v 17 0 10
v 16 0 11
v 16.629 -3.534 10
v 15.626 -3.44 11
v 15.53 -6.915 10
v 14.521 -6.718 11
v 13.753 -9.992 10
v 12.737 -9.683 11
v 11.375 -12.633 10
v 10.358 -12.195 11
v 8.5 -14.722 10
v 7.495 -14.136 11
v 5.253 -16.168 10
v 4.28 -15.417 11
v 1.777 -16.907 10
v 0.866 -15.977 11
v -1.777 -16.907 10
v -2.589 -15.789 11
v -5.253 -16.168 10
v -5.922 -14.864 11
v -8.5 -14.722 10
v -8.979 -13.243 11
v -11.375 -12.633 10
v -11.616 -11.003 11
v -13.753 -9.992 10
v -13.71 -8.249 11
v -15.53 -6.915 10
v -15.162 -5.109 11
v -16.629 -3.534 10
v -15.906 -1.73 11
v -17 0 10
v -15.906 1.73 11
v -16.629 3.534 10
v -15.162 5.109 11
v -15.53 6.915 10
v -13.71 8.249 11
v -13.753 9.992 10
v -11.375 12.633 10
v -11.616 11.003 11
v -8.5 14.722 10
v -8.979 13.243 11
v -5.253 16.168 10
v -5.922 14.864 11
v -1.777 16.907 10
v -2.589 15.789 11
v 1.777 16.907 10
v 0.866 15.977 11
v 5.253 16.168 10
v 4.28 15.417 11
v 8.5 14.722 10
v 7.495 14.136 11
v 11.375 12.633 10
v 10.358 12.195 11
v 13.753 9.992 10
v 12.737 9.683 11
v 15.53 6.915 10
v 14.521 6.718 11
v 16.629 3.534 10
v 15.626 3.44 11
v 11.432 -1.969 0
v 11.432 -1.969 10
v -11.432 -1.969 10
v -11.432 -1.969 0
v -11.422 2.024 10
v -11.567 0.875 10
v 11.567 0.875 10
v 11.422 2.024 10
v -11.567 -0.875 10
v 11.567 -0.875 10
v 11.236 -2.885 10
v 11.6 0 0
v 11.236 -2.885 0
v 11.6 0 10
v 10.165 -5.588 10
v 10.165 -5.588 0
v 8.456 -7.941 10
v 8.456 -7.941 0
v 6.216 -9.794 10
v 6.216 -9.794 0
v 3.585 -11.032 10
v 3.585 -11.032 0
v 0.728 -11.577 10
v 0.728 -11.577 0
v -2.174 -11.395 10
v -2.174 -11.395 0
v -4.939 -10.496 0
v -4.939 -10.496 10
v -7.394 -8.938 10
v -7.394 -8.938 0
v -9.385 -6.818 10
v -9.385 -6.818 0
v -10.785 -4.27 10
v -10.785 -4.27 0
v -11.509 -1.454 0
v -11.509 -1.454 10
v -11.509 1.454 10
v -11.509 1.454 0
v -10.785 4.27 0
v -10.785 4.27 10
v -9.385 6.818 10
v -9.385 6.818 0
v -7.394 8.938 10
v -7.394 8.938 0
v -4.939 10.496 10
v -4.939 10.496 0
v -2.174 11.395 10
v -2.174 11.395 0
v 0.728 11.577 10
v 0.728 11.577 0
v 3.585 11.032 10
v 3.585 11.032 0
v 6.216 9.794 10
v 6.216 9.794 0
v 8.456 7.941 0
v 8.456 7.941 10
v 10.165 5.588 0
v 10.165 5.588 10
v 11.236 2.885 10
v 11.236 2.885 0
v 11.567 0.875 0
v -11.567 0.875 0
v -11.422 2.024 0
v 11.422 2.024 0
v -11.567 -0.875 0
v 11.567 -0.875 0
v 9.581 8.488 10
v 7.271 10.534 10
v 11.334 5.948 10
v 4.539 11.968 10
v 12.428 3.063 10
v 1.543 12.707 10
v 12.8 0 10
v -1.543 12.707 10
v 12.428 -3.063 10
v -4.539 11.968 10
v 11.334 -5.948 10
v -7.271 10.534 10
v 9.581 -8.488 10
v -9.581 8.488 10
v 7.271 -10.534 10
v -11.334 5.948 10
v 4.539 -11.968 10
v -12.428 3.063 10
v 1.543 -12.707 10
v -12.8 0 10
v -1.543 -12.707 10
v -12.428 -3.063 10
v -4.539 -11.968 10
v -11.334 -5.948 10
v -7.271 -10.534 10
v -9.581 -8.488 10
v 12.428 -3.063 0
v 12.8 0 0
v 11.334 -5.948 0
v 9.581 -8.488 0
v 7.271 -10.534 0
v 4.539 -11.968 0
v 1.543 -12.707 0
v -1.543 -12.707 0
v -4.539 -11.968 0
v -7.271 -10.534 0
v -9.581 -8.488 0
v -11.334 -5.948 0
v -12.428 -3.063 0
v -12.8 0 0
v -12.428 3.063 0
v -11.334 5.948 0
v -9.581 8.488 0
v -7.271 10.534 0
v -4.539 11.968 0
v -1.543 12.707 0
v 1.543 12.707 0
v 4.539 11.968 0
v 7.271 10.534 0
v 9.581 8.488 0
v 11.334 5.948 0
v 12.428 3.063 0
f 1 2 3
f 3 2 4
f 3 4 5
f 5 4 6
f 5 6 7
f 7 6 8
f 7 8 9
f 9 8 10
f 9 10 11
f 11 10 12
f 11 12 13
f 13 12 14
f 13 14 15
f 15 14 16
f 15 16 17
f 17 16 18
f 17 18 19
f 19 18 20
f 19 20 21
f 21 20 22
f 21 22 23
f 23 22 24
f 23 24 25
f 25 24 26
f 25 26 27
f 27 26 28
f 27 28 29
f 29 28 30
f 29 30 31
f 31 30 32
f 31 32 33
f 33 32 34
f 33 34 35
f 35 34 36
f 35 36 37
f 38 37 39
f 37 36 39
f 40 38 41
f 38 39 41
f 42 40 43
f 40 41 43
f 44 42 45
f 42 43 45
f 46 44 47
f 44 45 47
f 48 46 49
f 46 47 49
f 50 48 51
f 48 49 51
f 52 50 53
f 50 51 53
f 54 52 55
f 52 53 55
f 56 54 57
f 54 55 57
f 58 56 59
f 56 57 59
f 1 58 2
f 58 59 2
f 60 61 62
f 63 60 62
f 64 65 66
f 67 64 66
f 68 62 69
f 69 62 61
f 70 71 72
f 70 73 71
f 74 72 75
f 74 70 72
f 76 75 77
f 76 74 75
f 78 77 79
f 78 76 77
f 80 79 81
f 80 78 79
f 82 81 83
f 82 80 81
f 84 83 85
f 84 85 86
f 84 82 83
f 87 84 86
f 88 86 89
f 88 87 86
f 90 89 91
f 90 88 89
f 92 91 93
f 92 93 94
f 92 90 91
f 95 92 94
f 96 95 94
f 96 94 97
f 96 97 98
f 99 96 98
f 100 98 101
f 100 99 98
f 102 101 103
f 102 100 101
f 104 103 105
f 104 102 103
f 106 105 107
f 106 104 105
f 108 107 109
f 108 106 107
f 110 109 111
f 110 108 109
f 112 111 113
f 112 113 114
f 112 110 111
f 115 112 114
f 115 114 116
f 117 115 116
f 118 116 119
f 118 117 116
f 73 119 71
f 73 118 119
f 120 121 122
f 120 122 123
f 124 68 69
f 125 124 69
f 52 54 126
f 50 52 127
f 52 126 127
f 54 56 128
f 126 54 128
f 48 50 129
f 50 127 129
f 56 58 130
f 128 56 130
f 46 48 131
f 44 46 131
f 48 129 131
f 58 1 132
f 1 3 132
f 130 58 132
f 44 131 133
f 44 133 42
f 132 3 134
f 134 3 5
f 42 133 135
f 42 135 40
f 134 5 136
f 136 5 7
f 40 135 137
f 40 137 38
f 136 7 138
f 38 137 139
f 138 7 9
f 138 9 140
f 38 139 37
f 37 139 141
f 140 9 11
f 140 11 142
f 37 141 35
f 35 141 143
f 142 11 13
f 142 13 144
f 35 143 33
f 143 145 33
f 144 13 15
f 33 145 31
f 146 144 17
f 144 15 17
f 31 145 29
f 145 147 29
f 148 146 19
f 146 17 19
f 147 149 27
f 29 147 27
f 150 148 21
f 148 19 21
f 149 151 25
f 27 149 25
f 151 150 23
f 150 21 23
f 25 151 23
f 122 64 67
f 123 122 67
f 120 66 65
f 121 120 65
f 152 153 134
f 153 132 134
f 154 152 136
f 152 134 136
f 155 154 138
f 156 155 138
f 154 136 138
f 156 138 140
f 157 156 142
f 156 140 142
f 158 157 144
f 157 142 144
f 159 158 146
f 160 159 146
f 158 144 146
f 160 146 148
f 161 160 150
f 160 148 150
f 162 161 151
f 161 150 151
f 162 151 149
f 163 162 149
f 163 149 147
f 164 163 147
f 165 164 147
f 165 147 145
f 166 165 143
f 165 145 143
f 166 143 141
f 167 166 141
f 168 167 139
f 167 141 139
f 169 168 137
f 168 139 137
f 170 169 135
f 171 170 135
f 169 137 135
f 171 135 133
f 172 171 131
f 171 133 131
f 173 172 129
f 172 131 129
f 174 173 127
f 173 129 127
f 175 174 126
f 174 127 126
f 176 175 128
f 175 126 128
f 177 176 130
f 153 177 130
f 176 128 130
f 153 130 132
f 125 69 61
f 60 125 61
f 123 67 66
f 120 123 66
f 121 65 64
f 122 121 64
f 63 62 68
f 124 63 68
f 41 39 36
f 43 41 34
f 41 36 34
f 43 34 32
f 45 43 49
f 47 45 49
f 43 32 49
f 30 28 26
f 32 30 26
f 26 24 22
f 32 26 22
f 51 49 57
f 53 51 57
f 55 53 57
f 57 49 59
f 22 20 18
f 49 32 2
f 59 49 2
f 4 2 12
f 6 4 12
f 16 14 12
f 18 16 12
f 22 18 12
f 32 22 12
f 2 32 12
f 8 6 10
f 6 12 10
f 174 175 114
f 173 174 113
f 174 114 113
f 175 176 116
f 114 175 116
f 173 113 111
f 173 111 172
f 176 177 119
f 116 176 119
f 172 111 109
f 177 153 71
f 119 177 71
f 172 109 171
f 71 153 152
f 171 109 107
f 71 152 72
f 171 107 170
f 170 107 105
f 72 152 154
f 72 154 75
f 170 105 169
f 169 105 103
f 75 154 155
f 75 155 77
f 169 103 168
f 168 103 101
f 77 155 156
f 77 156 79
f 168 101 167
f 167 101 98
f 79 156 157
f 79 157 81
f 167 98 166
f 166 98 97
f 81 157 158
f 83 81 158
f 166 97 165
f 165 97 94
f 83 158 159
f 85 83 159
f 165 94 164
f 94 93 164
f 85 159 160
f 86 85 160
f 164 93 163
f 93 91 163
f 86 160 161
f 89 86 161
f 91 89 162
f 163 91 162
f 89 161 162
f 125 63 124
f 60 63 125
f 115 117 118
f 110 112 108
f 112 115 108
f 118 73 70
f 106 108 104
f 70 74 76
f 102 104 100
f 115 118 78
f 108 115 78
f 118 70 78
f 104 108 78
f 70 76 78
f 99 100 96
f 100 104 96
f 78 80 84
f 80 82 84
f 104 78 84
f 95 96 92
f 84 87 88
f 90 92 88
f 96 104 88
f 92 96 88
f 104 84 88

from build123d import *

# Parameters (mm, degrees)
F0_W     = 1.2
F0_H     = 10
F4_DEPTH = 10


# Not quite as in the source:
# - a fillet or chamfer that OpenCascade refuses, or shapes differently, is made with other operations: its cross-section is extruded or revolved along the edge and cut away or added


with BuildPart() as f1:
    # F0 (on Front) → F1 (revolve)
    with BuildSketch(Plane.XZ):
        Polygon((0, 11), (0, 10), (11.6, 10), (12.8, 10), (18, 10), (18, 11), align=None)
        with Locations((12.2, 5)):
            Rectangle(F0_W, F0_H)
    revolve(axis=Axis((0, 0, 10.5), (0, 0, -1)))

    # F2: chamfer of 2 on 1 edges, made by hand

    # F2_s1 → F2_t2 (revolve, cut)
    with BuildSketch(Plane.XZ):
        Polygon((18, 9), (16, 11), (18, 11), align=None)
    revolve(axis=Axis((0, 0, 11), (0, 0, -1)), mode=Mode.SUBTRACT)


with BuildPart() as f4:
    # F3 (on face) → F4 (new body)
    with BuildSketch(Plane(origin=(0, 0, 10), x_dir=(1, 0, 0), z_dir=(0, 0, -1))):
        Polygon((-11.4316838985, 1.9689091509), (-11.5669518457, 0.875), (11.5669518457, 0.875), (11.4316838985, 1.9689091509), align=None)
    extrude(amount=F4_DEPTH)


with BuildPart() as f4b:
    # F3 (on face) → F4, piece 2 (new body)
    with BuildSketch(Plane(origin=(0, 0, 10), x_dir=(1, 0, 0), z_dir=(0, 0, -1))):
        Polygon((11.5669518457, -0.875), (-11.5669518457, -0.875), (-11.421984153, -2.0244204128), (11.421984153, -2.0244204128), align=None)
    extrude(amount=F4_DEPTH)


solid = Compound([f1.part, f4.part, f4b.part])
